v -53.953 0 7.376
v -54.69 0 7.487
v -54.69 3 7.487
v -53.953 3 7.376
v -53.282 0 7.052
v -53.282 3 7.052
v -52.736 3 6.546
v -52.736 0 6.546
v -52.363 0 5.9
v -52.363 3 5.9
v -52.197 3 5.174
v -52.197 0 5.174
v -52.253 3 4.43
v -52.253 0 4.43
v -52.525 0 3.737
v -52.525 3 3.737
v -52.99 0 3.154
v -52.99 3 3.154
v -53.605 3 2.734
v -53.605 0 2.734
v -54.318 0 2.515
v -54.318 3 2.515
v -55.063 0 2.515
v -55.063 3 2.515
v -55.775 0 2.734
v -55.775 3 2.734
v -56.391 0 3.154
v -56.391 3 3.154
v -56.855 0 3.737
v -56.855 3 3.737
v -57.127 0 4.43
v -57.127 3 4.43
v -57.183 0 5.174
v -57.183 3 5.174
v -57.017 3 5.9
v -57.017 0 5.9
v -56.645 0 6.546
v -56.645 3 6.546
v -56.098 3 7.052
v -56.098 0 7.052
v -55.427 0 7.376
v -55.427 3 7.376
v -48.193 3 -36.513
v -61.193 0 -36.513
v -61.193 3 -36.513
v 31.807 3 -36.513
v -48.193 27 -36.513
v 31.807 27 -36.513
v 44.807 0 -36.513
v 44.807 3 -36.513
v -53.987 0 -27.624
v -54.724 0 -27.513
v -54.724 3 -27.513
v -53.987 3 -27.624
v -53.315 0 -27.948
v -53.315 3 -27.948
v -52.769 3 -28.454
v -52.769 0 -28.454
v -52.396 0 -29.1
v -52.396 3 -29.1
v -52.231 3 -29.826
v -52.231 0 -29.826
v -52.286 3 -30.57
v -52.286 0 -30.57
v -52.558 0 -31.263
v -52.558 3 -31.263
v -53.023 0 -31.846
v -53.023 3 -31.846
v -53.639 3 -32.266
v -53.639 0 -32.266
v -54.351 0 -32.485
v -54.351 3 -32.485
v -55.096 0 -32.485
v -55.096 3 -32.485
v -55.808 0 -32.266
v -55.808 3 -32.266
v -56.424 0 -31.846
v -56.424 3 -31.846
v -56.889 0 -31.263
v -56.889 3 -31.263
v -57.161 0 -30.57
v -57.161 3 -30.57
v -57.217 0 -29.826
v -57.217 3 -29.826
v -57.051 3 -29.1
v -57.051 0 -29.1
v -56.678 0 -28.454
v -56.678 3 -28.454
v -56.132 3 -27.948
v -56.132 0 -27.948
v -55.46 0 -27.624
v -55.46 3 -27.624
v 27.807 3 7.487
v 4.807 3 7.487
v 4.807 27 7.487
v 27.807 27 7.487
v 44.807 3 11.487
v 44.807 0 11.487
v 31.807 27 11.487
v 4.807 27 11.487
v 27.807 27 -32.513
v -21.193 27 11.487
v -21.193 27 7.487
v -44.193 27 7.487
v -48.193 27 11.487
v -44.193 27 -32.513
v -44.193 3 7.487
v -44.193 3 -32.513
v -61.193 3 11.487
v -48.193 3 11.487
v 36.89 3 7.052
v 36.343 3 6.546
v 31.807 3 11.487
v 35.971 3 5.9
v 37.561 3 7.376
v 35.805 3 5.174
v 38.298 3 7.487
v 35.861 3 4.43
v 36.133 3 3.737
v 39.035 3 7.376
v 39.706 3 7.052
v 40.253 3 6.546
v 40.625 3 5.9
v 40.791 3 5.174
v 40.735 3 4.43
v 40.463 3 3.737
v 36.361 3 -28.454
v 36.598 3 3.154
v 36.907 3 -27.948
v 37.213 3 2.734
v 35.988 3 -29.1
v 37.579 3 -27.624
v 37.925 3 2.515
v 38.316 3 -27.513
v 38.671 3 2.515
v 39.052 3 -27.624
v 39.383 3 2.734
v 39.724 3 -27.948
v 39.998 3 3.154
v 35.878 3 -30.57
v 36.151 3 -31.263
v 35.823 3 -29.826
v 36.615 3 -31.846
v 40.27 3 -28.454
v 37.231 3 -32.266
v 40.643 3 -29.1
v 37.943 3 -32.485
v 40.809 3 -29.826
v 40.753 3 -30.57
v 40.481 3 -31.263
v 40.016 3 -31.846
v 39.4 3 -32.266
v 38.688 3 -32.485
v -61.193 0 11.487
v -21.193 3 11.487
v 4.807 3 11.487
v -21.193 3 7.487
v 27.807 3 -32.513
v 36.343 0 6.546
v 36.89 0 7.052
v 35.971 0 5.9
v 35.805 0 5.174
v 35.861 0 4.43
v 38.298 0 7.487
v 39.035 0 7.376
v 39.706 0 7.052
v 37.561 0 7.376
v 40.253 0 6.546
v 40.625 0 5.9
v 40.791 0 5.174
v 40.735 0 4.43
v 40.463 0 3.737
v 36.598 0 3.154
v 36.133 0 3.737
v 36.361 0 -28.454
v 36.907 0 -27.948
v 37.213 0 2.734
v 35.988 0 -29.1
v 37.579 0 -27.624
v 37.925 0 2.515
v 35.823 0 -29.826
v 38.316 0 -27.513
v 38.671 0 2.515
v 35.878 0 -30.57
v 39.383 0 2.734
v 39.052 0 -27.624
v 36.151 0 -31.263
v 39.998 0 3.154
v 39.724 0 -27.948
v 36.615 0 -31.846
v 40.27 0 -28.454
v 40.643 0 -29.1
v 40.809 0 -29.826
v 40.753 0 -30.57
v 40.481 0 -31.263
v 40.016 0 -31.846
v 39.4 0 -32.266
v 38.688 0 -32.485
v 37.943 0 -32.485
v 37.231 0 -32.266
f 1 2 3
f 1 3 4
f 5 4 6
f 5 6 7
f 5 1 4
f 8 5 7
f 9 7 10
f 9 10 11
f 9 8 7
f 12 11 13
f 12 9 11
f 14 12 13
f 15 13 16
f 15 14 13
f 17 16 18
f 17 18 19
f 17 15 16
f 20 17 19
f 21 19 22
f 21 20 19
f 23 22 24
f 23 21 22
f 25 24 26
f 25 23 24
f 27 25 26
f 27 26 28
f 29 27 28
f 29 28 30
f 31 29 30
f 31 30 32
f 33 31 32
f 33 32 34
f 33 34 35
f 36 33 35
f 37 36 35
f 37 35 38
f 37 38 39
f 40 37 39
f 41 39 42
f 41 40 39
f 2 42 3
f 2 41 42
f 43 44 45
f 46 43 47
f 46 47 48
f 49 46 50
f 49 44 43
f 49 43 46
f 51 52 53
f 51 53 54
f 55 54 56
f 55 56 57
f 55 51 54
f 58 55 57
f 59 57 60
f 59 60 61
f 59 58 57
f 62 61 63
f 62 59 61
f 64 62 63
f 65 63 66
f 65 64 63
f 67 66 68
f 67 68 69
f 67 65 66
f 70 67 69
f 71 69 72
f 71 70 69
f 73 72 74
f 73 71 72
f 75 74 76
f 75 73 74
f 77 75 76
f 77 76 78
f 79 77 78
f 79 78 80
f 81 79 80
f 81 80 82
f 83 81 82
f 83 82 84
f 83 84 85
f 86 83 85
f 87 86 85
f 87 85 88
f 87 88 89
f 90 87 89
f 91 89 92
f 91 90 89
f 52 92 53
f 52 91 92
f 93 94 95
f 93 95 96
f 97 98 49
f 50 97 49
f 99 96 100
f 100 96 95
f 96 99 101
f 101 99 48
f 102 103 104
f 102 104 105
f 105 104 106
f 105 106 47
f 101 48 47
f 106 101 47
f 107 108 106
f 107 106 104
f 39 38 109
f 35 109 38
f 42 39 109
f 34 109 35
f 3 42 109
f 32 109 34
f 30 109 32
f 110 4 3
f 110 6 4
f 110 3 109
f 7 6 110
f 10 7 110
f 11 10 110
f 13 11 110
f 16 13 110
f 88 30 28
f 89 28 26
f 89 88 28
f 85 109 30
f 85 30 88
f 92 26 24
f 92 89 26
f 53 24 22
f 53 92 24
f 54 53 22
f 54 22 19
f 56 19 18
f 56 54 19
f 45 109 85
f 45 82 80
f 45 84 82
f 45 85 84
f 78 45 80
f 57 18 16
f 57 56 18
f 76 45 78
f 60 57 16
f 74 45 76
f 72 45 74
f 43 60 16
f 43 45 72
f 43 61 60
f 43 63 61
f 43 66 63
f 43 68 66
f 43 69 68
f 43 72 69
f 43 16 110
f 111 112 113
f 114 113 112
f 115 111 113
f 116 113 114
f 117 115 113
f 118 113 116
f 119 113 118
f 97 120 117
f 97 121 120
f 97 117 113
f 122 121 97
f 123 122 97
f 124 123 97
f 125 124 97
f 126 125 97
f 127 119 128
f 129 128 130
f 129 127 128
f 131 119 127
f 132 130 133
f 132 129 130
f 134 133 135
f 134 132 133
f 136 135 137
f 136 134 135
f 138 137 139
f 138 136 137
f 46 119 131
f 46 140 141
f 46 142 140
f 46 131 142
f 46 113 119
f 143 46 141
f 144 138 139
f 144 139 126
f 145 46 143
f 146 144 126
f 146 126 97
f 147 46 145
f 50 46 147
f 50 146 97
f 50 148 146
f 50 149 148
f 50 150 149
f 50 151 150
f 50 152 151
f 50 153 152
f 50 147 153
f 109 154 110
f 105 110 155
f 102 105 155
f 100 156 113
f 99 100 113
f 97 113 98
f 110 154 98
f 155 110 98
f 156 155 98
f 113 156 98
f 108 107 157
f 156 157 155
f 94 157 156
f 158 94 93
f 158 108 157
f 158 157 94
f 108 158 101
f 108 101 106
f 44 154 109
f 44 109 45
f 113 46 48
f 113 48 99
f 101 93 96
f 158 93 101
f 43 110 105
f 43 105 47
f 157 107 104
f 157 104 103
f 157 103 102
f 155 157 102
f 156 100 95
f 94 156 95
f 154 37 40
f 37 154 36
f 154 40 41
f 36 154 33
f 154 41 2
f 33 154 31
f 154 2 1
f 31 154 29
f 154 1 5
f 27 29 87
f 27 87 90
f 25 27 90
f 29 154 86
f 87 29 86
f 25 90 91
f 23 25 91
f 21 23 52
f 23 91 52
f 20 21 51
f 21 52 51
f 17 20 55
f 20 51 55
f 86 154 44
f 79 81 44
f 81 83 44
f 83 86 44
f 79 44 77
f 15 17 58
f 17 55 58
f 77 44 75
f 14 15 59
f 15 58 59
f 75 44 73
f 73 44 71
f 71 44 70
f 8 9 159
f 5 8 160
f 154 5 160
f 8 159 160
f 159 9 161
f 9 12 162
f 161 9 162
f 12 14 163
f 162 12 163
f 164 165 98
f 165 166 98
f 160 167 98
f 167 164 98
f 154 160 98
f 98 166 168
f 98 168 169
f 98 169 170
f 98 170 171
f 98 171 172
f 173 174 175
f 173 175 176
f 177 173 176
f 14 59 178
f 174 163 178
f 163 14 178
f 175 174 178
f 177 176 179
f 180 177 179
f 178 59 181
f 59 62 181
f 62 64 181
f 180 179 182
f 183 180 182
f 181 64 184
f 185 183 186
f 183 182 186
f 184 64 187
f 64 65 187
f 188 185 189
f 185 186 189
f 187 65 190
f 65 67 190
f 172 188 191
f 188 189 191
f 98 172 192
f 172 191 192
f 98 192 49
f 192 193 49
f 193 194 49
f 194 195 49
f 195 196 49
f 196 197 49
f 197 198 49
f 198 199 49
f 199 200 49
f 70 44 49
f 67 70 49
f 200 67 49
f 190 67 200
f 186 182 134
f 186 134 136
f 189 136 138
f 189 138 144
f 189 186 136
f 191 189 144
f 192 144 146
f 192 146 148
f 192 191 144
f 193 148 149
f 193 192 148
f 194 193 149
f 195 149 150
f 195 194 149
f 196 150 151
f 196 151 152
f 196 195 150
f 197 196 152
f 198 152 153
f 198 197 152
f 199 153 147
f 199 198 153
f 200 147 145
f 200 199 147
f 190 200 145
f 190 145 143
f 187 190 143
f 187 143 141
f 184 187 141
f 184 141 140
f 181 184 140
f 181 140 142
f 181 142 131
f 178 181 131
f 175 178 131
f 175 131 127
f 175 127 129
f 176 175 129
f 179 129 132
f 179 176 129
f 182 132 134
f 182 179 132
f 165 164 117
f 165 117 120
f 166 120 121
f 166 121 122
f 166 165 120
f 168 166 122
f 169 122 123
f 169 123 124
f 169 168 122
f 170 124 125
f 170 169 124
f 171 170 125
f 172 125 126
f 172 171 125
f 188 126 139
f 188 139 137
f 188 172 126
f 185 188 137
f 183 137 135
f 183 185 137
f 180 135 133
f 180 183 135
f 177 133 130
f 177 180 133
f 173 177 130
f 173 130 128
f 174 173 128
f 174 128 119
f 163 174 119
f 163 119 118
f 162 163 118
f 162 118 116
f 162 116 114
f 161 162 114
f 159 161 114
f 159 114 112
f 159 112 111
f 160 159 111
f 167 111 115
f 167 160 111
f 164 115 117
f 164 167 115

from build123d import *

# Parameters (mm, degrees)
SKETCH1_W           = 106
SKETCH1_H           = 48
SKETCH1_R           = 2.5
BOSS_EXTRUDE3_DEPTH = 3
BOSS_EXTRUDE4_DEPTH = 24


with BuildPart() as part:
    # Sketch1 → Boss-Extrude3 (new body)
    with BuildSketch(Plane(origin=(0, 0, 0), x_dir=(1, 0, 0), z_dir=(0, 1, 0))):
        with Locations((-8.19327026, 12.513208654)):
            Rectangle(SKETCH1_W, SKETCH1_H)
        with Locations(Location((-54.723551999, 30.013208654, 0), (0, 0, 270))):
            Circle(SKETCH1_R, mode=Mode.SUBTRACT)
        with Locations(Location((-54.690171501, -4.986791346, 0), (0, 0, 270))):
            Circle(SKETCH1_R, mode=Mode.SUBTRACT)
        with Locations(Location((38.31560417, 30.013208654, 0), (0, 0, 270))):
            Circle(SKETCH1_R, mode=Mode.SUBTRACT)
        with Locations(Location((38.297946807, -4.986791346, 0), (0, 0, 270))):
            Circle(SKETCH1_R, mode=Mode.SUBTRACT)
    extrude(amount=BOSS_EXTRUDE3_DEPTH)

    # Sketch3 → Boss-Extrude4 (add)
    with BuildSketch(Plane(origin=(0, 3, 0), x_dir=(1, 0, 0), z_dir=(0, 1, 0))):
        Polygon((-44.19327026, 32.513208654), (-44.19327026, -7.486791346), (-21.19327026, -7.486791346), (-21.19327026, -11.486791346), (-48.19327026, -11.486791346), (-48.19327026, 36.513208654), (31.80672974, 36.513208654), (31.80672974, -11.486791346), (4.80672974, -11.486791346), (4.80672974, -7.486791346), (27.80672974, -7.486791346), (27.80672974, 32.513208654), align=None)
    extrude(amount=BOSS_EXTRUDE4_DEPTH)


solid = part.part
